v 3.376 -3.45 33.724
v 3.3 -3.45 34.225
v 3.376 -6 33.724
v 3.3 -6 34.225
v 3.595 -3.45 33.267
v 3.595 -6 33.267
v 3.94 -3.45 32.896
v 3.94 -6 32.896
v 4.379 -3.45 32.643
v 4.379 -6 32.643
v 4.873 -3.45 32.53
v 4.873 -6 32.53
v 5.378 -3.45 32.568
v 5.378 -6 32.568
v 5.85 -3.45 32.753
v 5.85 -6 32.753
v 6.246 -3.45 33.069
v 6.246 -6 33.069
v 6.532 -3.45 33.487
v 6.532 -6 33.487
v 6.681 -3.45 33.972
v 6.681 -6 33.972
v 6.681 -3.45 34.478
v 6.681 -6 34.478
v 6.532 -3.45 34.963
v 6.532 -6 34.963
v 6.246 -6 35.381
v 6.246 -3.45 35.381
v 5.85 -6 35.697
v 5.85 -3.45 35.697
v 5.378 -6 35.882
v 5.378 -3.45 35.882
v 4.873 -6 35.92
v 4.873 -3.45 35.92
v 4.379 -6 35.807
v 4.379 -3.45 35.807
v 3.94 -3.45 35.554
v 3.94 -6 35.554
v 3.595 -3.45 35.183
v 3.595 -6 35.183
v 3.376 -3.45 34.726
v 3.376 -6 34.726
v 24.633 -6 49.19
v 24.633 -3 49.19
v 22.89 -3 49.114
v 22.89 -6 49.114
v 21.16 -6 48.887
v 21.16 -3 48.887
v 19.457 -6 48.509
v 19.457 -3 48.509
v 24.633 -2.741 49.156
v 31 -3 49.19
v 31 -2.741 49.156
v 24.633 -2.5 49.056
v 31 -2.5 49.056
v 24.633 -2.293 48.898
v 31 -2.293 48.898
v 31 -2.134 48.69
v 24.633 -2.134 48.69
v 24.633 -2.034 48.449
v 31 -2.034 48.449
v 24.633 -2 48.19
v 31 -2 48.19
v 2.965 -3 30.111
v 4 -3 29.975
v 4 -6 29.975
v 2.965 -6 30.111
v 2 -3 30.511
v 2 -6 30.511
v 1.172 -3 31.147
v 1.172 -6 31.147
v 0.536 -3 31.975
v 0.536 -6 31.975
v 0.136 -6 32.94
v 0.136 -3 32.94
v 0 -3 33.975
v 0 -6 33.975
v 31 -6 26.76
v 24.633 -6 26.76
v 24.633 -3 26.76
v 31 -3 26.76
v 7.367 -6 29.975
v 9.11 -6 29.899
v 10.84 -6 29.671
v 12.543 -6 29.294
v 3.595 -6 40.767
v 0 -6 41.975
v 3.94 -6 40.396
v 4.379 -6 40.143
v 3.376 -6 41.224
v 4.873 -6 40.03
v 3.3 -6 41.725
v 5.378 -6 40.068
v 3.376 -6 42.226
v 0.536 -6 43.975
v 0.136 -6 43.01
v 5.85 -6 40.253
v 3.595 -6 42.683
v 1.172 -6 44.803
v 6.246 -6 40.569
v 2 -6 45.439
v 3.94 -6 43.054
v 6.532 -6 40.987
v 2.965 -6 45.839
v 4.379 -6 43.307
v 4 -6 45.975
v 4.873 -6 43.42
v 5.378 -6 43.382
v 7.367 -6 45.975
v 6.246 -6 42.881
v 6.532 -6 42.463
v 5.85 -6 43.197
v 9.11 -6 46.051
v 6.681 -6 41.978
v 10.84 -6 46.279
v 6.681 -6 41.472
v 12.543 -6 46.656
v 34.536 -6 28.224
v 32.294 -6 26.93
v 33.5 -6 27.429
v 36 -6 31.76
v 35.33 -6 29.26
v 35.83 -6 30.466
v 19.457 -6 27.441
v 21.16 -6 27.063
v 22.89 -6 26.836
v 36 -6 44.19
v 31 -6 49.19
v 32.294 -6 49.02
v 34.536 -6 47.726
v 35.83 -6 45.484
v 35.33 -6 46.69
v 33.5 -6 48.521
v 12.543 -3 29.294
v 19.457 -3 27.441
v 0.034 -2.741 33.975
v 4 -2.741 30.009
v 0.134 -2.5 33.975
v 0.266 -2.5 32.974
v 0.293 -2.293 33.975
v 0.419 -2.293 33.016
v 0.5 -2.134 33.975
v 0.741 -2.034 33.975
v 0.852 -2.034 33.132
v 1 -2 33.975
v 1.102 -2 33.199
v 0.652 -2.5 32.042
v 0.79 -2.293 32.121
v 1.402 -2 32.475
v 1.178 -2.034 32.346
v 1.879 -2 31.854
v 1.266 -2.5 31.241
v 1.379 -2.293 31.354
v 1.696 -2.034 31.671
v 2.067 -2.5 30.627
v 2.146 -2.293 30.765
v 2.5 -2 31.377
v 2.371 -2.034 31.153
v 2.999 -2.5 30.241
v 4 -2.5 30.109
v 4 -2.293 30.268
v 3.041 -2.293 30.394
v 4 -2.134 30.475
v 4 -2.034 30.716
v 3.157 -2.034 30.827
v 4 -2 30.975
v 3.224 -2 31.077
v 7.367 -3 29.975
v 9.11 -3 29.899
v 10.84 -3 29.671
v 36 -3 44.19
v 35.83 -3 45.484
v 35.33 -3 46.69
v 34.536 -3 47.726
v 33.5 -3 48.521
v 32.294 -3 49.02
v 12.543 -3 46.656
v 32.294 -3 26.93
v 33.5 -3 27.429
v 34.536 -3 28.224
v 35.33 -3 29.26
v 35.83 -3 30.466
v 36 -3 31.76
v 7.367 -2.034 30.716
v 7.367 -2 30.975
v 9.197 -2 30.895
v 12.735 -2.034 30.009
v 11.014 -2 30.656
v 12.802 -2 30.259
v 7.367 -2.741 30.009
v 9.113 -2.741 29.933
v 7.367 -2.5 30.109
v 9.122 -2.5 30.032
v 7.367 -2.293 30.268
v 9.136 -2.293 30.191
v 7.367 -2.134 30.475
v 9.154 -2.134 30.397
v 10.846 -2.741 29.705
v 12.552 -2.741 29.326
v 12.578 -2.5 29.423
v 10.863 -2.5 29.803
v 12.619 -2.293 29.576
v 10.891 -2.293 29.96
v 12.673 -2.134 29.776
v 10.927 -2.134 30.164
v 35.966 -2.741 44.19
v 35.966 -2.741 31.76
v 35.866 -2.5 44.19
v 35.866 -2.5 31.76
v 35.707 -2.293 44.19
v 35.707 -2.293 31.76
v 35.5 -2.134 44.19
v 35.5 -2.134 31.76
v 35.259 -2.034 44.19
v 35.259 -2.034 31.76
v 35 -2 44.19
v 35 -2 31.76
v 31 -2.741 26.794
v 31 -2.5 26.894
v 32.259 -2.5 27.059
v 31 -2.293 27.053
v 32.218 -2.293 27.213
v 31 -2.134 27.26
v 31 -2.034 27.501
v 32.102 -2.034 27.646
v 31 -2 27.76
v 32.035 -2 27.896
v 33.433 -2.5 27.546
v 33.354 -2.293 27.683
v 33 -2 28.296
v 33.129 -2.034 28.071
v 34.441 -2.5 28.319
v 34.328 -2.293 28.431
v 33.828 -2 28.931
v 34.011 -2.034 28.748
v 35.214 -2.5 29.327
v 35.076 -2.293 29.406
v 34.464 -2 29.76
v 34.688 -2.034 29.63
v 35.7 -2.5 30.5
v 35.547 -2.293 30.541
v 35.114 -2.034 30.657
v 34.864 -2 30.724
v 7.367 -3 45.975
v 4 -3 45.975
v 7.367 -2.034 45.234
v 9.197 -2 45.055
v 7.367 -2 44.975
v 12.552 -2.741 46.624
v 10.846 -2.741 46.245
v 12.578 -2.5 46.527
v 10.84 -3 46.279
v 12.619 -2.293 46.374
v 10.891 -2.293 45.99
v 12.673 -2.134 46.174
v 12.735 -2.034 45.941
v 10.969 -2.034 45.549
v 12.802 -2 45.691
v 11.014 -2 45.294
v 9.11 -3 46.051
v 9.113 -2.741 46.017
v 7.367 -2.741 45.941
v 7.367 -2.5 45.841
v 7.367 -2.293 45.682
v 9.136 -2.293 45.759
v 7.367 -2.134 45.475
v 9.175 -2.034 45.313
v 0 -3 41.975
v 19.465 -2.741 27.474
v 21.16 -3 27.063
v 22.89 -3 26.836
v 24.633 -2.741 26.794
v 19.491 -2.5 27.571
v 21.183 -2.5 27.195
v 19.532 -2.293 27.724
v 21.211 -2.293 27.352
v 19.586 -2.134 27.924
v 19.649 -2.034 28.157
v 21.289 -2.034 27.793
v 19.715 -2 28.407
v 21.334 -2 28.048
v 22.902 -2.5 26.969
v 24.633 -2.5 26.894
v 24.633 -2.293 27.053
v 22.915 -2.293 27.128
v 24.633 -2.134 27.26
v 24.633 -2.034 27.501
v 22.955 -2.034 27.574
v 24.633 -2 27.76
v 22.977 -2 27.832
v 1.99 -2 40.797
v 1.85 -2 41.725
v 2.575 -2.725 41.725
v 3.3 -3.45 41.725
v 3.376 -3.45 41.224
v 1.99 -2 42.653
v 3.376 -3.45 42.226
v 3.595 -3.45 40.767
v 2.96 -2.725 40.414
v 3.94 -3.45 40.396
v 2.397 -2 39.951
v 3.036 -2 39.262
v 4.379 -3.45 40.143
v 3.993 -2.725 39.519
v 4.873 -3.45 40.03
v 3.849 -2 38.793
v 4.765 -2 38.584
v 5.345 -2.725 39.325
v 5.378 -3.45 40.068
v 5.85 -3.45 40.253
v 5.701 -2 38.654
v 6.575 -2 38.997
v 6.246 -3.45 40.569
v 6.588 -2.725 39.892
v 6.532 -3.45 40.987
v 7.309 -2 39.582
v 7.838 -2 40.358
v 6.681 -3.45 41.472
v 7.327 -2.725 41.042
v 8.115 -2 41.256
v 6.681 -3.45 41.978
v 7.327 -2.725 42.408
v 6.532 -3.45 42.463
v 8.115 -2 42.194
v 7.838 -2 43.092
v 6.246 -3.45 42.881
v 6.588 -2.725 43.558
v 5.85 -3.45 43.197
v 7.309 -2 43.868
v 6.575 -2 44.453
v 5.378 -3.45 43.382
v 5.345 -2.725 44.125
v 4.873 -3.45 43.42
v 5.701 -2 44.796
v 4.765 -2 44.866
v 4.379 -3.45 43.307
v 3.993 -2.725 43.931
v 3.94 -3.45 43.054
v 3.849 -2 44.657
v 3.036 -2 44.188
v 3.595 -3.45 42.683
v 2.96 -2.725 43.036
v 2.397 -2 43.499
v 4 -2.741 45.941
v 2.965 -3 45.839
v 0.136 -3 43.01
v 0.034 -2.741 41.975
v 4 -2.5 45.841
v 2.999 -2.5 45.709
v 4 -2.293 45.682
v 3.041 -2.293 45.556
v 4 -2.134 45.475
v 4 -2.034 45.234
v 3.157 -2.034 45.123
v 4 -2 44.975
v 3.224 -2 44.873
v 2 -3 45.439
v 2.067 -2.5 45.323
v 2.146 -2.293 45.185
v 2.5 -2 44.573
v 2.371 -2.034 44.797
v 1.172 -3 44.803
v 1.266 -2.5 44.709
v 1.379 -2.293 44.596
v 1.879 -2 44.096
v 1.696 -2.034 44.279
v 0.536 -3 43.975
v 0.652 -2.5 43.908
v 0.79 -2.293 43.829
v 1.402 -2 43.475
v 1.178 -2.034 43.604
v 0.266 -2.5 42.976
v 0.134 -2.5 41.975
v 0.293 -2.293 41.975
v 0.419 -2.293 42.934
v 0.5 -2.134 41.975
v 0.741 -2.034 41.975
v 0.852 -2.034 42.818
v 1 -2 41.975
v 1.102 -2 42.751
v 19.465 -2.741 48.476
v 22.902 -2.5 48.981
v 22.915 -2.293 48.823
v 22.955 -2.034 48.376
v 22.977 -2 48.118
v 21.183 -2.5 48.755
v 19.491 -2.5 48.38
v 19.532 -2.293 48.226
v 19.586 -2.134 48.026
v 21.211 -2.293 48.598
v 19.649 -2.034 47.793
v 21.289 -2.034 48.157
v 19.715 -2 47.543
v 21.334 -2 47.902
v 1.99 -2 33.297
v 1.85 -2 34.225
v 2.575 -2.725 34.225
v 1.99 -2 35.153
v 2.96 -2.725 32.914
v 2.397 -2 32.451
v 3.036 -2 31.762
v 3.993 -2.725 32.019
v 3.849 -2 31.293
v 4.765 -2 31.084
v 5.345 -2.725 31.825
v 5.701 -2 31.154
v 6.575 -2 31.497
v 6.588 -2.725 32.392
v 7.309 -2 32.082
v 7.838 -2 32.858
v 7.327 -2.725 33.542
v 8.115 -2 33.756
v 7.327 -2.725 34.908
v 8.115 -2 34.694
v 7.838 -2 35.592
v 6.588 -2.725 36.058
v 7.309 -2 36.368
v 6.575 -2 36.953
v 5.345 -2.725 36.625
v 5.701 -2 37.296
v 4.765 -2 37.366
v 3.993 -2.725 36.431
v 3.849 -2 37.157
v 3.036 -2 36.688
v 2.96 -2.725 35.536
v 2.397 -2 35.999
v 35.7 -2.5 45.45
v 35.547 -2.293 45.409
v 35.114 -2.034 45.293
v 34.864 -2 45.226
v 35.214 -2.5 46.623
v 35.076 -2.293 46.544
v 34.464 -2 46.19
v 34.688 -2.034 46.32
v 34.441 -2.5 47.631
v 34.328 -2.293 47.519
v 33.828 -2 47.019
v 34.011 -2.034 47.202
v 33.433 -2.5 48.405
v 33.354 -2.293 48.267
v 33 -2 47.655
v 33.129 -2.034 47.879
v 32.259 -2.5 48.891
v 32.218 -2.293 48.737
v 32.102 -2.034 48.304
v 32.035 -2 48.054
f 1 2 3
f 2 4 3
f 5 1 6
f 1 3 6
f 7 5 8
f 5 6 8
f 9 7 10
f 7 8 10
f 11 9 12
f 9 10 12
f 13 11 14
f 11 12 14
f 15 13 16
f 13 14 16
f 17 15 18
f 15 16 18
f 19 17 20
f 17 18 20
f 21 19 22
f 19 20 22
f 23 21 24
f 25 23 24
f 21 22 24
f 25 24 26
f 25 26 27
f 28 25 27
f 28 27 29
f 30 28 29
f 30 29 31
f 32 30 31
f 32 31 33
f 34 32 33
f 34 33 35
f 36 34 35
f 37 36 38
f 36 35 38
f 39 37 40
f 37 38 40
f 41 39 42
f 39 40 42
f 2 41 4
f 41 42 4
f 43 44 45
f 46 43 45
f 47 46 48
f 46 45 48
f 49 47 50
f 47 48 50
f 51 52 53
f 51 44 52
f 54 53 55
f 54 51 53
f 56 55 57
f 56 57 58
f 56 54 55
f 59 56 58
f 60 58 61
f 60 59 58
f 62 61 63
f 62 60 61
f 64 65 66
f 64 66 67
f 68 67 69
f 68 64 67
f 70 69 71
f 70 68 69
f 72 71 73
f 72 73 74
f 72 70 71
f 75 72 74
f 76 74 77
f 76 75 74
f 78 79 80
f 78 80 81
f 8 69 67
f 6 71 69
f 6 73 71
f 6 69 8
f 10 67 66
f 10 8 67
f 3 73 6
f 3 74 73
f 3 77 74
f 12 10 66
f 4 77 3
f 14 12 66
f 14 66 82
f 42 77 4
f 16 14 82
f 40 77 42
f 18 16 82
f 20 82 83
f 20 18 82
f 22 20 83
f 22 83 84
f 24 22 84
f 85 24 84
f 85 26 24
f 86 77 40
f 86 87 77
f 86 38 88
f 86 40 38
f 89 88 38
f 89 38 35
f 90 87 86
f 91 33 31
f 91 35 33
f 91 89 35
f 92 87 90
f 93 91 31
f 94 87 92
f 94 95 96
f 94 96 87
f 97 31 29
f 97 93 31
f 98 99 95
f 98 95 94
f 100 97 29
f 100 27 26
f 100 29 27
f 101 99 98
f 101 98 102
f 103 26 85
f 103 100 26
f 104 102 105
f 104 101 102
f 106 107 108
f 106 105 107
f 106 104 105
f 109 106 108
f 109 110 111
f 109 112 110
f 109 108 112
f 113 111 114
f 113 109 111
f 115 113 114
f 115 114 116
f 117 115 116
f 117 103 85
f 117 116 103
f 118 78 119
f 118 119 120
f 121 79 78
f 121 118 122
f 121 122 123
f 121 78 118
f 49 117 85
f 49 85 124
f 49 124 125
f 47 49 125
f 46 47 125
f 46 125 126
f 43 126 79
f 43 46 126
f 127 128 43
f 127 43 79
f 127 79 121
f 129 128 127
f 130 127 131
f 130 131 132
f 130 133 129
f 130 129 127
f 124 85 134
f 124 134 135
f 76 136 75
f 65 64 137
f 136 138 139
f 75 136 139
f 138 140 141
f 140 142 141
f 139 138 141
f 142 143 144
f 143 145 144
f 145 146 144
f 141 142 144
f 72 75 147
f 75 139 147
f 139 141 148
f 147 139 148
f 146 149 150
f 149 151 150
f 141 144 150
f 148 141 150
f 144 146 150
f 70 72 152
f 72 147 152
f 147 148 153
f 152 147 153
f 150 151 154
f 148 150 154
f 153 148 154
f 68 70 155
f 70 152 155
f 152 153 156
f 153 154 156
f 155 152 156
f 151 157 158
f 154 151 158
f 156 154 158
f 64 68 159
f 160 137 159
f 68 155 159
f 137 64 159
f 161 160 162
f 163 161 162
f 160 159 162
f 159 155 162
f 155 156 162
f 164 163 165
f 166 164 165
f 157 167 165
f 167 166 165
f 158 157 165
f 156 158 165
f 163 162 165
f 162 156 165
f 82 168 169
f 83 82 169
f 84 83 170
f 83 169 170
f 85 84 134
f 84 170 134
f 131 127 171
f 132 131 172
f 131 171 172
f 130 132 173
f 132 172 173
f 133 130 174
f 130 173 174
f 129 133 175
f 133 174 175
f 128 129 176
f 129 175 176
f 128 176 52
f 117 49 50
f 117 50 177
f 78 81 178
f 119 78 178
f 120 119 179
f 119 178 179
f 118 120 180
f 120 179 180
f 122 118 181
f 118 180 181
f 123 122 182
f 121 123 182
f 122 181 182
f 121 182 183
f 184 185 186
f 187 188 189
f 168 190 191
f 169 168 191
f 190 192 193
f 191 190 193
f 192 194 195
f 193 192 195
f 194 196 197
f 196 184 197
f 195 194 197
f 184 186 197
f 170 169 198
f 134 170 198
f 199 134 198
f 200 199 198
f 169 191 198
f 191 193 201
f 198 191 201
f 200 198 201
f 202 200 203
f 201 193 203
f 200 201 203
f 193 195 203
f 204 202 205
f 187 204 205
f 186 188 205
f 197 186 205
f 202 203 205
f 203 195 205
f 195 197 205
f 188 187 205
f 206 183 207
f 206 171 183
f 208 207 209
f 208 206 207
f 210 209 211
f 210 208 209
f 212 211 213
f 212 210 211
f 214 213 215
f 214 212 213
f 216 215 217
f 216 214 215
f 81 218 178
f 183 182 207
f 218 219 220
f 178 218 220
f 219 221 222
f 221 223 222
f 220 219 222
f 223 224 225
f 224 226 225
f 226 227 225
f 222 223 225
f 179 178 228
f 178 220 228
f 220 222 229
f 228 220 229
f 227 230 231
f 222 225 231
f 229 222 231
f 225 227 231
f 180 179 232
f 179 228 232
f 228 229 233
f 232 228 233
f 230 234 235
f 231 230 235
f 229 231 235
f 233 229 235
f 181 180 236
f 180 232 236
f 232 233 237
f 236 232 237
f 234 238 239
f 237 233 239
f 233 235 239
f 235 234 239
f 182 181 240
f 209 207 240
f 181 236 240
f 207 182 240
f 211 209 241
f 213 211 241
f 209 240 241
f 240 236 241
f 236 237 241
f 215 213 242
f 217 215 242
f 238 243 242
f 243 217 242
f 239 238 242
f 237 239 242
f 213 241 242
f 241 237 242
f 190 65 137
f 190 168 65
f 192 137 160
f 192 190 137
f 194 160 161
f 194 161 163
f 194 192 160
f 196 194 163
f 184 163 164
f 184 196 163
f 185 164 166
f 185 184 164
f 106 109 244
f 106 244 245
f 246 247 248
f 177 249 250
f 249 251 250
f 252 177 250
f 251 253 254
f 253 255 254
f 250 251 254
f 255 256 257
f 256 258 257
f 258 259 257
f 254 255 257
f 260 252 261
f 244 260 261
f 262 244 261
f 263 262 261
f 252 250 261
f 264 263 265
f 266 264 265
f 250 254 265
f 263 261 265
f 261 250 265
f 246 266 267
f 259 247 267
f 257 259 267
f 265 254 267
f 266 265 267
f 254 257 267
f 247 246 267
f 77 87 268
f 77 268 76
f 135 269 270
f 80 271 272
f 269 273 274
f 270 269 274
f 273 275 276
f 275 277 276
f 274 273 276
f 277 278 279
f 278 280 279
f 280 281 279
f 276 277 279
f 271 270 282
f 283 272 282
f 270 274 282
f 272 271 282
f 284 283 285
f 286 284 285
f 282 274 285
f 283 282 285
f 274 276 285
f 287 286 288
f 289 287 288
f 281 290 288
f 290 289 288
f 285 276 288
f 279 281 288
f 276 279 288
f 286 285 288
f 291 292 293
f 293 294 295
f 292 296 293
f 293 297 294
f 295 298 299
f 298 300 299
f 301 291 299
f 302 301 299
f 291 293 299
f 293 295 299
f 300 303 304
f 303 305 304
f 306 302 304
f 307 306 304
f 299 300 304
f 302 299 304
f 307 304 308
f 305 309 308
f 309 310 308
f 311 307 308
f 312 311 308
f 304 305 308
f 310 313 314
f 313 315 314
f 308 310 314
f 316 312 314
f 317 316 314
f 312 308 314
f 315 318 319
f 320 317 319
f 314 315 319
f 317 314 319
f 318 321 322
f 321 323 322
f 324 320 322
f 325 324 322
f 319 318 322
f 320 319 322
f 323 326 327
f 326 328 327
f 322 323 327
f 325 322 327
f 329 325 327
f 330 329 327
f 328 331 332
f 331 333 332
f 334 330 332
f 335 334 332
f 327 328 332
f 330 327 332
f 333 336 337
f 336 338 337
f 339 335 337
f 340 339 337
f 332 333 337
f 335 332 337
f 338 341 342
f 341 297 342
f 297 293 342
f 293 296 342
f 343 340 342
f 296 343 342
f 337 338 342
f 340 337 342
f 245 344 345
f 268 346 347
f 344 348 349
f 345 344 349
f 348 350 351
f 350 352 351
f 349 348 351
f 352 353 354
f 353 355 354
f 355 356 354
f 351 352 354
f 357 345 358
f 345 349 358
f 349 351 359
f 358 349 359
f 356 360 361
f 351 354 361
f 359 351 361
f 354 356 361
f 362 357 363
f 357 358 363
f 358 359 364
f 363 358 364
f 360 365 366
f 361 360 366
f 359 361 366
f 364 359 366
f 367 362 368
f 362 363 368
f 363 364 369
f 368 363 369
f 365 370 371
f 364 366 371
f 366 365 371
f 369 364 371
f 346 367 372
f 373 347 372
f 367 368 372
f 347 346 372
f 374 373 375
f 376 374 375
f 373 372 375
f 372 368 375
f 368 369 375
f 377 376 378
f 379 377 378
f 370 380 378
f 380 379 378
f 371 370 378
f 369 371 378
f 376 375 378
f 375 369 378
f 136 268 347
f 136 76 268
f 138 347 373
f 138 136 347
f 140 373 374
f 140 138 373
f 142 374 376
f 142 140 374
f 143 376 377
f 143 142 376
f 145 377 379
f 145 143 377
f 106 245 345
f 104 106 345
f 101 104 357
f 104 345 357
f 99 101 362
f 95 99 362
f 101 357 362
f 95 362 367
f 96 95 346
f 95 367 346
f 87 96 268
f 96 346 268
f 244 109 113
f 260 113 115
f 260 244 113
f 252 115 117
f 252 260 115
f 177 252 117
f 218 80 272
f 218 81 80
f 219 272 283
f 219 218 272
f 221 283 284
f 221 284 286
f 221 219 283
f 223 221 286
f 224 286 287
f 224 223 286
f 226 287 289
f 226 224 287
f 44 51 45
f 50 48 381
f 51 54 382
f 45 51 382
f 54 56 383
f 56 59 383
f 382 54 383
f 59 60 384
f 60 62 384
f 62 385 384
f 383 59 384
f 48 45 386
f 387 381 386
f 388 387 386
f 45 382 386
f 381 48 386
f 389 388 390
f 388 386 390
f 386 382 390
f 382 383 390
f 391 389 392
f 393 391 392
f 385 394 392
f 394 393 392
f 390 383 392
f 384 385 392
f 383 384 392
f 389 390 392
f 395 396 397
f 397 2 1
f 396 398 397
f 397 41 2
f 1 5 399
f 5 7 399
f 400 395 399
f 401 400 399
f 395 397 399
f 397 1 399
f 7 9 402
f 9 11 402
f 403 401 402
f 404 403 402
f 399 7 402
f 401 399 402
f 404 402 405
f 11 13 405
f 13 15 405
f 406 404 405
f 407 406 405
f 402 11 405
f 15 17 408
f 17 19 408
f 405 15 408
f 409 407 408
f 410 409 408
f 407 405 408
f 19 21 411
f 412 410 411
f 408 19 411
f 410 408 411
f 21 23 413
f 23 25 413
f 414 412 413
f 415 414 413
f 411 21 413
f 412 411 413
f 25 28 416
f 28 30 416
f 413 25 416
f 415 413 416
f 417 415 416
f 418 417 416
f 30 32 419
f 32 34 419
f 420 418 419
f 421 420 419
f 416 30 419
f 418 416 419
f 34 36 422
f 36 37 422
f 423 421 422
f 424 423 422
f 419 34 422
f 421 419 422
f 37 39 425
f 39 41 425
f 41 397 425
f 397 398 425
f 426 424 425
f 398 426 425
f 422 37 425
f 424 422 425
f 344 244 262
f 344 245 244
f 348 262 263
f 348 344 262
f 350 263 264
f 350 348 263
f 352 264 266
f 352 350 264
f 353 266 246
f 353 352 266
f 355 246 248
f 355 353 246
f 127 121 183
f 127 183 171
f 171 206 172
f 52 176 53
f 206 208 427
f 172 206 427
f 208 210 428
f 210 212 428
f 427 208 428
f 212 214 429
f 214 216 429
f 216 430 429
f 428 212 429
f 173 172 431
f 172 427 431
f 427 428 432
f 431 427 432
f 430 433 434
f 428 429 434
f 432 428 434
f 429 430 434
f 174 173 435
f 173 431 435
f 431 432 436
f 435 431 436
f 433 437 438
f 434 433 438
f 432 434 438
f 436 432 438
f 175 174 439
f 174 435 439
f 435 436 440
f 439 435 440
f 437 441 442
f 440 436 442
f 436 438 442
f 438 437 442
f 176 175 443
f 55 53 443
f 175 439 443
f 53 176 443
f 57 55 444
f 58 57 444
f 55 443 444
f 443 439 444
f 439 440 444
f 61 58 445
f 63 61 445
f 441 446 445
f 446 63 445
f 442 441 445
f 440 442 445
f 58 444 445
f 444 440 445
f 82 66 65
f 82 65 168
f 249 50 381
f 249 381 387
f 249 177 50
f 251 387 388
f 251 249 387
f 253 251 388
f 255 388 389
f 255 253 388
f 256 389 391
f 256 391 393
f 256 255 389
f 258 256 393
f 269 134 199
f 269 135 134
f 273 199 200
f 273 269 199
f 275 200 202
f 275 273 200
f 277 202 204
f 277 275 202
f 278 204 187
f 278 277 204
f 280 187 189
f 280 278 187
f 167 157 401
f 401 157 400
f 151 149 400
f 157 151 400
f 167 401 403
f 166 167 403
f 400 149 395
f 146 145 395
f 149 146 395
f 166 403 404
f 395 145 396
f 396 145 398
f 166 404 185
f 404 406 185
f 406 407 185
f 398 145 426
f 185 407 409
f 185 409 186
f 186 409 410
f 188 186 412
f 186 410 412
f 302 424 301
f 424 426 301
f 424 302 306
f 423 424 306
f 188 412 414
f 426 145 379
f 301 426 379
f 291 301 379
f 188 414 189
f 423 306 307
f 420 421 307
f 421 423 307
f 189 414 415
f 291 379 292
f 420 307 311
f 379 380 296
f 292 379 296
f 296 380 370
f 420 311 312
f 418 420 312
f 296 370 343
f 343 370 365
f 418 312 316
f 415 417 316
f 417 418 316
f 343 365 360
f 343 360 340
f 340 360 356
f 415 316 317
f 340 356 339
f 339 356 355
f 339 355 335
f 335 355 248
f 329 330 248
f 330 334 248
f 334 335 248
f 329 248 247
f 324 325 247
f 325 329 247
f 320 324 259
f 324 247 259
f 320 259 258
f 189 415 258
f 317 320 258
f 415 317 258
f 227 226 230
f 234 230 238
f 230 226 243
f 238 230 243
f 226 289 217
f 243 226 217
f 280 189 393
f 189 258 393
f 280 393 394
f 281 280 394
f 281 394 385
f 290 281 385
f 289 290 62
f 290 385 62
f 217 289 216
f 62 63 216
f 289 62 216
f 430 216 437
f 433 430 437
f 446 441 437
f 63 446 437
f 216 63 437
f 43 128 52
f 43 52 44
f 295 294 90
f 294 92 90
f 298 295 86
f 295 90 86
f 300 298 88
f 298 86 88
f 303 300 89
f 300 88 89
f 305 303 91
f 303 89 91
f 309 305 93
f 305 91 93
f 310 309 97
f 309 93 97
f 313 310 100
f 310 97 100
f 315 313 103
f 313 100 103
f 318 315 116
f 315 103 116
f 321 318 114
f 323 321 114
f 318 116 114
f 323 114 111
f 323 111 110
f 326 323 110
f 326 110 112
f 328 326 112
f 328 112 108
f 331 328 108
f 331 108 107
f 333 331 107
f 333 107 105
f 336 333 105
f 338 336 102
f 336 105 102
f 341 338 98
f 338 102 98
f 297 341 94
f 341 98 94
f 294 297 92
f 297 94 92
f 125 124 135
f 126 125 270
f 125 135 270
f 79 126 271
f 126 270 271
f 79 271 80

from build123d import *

# Parameters (mm, degrees)
DODANIE_WYCI_GNI_CIE3_DEPTH                      = 4
POG_BIENIE_STO_KOWE_POD_M3_RUB_Z_BEM_D           = 3.4
POG_BIENIE_STO_KOWE_POD_M3_RUB_Z_BEM_DEPTH       = 8
POG_BIENIE_STO_KOWE_POD_M3_RUB_Z_BEM_CSINK_D     = 6.3
POG_BIENIE_STO_KOWE_POD_M3_RUB_Z_BEM_CSINK_ANGLE = 90
POG_BIENIE_STO_KOWE_POD_M3_RUB_Z_BEM_TIP         = 1.021463052
ZAOKR_GLENIE2_R                                  = 4
ZAOKR_GLENIE3_R                                  = 20
ZAOKR_GLENIE4_R                                  = 5
ZAOKR_GLENIE5_R                                  = 1


with BuildPart() as part:
    # Szkic21 → Dodanie-wyciągnięcie3 (new body)
    with BuildSketch(Plane.XZ.offset(6)):
        Polygon((0, 37.975009918), (0, 29.975009918), (10, 29.975009918), (22, 26.759619609), (36, 26.759619609), (36, 37.975009918), align=None)
        Polygon((0, 45.975009918), (0, 37.975009918), (36, 37.975009918), (36, 49.190400227), (22, 49.190400227), (10, 45.975009918), align=None)
    extrude(amount=-DODANIE_WYCI_GNI_CIE3_DEPTH)

    # Pogłębienie stożkowe pod M3 Śrubę z łbem soczewkowym2
    with Locations(Plane(origin=(0, -2, 0), x_dir=(1, 0, 0), z_dir=(0, 1, 0))):
        with Locations((5, -41.725009918), (5, -34.225009918)):
            CounterSinkHole(POG_BIENIE_STO_KOWE_POD_M3_RUB_Z_BEM_D / 2, POG_BIENIE_STO_KOWE_POD_M3_RUB_Z_BEM_CSINK_D / 2, depth=POG_BIENIE_STO_KOWE_POD_M3_RUB_Z_BEM_DEPTH, counter_sink_angle=POG_BIENIE_STO_KOWE_POD_M3_RUB_Z_BEM_CSINK_ANGLE)
            with Locations((0, 0, -(POG_BIENIE_STO_KOWE_POD_M3_RUB_Z_BEM_DEPTH + POG_BIENIE_STO_KOWE_POD_M3_RUB_Z_BEM_TIP / 2))):  # 118° drill point
                Cone(0, POG_BIENIE_STO_KOWE_POD_M3_RUB_Z_BEM_D / 2, POG_BIENIE_STO_KOWE_POD_M3_RUB_Z_BEM_TIP, mode=Mode.SUBTRACT)

    # Zaokrąglenie2
    zaokr_glenie2_edges = [part.edges().sort_by_distance(p)[0] for p in [
        (0, -4, 45.975009918),
        (0, -4, 29.975009918),
    ]]
    fillet(zaokr_glenie2_edges, radius=ZAOKR_GLENIE2_R)

    # Zaokrąglenie3
    zaokr_glenie3_edges = [part.edges().sort_by_distance(p)[0] for p in [
        (22, -4, 49.190400227),
        (10, -4, 45.975009918),
        (22, -4, 26.759619609),
        (10, -4, 29.975009918),
    ]]
    fillet(zaokr_glenie3_edges, radius=ZAOKR_GLENIE3_R)

    # Zaokrąglenie4
    zaokr_glenie4_edges = [part.edges().sort_by_distance(p)[0] for p in [
        (36, -4, 49.190400227),
        (36, -4, 26.759619609),
    ]]
    fillet(zaokr_glenie4_edges, radius=ZAOKR_GLENIE4_R)

    # Zaokrąglenie5
    zaokr_glenie5_edges = [part.edges().sort_by_distance(p)[0] for p in [
        (34.535533906, -2, 28.224085703),
        (27.816524976, -2, 26.759619609),
        (22.022526107, -2, 26.930722382),
        (16, -2, 28.367314764),
        (9.977473893, -2, 29.803907146),
        (5.683475024, -2, 29.975009918),
        (1.171572875, -2, 31.146582793),
        (0, -2, 37.975009918),
        (1.171572875, -2, 44.803437043),
        (5.683475024, -2, 45.975009918),
        (9.977473893, -2, 46.146112691),
        (16, -2, 47.582705073),
        (22.022526107, -2, 49.019297455),
        (27.816524976, -2, 49.190400227),
        (34.535533906, -2, 47.725934133),
        (36, -2, 37.975009918),
    ]]
    fillet(zaokr_glenie5_edges, radius=ZAOKR_GLENIE5_R)


solid = part.part
